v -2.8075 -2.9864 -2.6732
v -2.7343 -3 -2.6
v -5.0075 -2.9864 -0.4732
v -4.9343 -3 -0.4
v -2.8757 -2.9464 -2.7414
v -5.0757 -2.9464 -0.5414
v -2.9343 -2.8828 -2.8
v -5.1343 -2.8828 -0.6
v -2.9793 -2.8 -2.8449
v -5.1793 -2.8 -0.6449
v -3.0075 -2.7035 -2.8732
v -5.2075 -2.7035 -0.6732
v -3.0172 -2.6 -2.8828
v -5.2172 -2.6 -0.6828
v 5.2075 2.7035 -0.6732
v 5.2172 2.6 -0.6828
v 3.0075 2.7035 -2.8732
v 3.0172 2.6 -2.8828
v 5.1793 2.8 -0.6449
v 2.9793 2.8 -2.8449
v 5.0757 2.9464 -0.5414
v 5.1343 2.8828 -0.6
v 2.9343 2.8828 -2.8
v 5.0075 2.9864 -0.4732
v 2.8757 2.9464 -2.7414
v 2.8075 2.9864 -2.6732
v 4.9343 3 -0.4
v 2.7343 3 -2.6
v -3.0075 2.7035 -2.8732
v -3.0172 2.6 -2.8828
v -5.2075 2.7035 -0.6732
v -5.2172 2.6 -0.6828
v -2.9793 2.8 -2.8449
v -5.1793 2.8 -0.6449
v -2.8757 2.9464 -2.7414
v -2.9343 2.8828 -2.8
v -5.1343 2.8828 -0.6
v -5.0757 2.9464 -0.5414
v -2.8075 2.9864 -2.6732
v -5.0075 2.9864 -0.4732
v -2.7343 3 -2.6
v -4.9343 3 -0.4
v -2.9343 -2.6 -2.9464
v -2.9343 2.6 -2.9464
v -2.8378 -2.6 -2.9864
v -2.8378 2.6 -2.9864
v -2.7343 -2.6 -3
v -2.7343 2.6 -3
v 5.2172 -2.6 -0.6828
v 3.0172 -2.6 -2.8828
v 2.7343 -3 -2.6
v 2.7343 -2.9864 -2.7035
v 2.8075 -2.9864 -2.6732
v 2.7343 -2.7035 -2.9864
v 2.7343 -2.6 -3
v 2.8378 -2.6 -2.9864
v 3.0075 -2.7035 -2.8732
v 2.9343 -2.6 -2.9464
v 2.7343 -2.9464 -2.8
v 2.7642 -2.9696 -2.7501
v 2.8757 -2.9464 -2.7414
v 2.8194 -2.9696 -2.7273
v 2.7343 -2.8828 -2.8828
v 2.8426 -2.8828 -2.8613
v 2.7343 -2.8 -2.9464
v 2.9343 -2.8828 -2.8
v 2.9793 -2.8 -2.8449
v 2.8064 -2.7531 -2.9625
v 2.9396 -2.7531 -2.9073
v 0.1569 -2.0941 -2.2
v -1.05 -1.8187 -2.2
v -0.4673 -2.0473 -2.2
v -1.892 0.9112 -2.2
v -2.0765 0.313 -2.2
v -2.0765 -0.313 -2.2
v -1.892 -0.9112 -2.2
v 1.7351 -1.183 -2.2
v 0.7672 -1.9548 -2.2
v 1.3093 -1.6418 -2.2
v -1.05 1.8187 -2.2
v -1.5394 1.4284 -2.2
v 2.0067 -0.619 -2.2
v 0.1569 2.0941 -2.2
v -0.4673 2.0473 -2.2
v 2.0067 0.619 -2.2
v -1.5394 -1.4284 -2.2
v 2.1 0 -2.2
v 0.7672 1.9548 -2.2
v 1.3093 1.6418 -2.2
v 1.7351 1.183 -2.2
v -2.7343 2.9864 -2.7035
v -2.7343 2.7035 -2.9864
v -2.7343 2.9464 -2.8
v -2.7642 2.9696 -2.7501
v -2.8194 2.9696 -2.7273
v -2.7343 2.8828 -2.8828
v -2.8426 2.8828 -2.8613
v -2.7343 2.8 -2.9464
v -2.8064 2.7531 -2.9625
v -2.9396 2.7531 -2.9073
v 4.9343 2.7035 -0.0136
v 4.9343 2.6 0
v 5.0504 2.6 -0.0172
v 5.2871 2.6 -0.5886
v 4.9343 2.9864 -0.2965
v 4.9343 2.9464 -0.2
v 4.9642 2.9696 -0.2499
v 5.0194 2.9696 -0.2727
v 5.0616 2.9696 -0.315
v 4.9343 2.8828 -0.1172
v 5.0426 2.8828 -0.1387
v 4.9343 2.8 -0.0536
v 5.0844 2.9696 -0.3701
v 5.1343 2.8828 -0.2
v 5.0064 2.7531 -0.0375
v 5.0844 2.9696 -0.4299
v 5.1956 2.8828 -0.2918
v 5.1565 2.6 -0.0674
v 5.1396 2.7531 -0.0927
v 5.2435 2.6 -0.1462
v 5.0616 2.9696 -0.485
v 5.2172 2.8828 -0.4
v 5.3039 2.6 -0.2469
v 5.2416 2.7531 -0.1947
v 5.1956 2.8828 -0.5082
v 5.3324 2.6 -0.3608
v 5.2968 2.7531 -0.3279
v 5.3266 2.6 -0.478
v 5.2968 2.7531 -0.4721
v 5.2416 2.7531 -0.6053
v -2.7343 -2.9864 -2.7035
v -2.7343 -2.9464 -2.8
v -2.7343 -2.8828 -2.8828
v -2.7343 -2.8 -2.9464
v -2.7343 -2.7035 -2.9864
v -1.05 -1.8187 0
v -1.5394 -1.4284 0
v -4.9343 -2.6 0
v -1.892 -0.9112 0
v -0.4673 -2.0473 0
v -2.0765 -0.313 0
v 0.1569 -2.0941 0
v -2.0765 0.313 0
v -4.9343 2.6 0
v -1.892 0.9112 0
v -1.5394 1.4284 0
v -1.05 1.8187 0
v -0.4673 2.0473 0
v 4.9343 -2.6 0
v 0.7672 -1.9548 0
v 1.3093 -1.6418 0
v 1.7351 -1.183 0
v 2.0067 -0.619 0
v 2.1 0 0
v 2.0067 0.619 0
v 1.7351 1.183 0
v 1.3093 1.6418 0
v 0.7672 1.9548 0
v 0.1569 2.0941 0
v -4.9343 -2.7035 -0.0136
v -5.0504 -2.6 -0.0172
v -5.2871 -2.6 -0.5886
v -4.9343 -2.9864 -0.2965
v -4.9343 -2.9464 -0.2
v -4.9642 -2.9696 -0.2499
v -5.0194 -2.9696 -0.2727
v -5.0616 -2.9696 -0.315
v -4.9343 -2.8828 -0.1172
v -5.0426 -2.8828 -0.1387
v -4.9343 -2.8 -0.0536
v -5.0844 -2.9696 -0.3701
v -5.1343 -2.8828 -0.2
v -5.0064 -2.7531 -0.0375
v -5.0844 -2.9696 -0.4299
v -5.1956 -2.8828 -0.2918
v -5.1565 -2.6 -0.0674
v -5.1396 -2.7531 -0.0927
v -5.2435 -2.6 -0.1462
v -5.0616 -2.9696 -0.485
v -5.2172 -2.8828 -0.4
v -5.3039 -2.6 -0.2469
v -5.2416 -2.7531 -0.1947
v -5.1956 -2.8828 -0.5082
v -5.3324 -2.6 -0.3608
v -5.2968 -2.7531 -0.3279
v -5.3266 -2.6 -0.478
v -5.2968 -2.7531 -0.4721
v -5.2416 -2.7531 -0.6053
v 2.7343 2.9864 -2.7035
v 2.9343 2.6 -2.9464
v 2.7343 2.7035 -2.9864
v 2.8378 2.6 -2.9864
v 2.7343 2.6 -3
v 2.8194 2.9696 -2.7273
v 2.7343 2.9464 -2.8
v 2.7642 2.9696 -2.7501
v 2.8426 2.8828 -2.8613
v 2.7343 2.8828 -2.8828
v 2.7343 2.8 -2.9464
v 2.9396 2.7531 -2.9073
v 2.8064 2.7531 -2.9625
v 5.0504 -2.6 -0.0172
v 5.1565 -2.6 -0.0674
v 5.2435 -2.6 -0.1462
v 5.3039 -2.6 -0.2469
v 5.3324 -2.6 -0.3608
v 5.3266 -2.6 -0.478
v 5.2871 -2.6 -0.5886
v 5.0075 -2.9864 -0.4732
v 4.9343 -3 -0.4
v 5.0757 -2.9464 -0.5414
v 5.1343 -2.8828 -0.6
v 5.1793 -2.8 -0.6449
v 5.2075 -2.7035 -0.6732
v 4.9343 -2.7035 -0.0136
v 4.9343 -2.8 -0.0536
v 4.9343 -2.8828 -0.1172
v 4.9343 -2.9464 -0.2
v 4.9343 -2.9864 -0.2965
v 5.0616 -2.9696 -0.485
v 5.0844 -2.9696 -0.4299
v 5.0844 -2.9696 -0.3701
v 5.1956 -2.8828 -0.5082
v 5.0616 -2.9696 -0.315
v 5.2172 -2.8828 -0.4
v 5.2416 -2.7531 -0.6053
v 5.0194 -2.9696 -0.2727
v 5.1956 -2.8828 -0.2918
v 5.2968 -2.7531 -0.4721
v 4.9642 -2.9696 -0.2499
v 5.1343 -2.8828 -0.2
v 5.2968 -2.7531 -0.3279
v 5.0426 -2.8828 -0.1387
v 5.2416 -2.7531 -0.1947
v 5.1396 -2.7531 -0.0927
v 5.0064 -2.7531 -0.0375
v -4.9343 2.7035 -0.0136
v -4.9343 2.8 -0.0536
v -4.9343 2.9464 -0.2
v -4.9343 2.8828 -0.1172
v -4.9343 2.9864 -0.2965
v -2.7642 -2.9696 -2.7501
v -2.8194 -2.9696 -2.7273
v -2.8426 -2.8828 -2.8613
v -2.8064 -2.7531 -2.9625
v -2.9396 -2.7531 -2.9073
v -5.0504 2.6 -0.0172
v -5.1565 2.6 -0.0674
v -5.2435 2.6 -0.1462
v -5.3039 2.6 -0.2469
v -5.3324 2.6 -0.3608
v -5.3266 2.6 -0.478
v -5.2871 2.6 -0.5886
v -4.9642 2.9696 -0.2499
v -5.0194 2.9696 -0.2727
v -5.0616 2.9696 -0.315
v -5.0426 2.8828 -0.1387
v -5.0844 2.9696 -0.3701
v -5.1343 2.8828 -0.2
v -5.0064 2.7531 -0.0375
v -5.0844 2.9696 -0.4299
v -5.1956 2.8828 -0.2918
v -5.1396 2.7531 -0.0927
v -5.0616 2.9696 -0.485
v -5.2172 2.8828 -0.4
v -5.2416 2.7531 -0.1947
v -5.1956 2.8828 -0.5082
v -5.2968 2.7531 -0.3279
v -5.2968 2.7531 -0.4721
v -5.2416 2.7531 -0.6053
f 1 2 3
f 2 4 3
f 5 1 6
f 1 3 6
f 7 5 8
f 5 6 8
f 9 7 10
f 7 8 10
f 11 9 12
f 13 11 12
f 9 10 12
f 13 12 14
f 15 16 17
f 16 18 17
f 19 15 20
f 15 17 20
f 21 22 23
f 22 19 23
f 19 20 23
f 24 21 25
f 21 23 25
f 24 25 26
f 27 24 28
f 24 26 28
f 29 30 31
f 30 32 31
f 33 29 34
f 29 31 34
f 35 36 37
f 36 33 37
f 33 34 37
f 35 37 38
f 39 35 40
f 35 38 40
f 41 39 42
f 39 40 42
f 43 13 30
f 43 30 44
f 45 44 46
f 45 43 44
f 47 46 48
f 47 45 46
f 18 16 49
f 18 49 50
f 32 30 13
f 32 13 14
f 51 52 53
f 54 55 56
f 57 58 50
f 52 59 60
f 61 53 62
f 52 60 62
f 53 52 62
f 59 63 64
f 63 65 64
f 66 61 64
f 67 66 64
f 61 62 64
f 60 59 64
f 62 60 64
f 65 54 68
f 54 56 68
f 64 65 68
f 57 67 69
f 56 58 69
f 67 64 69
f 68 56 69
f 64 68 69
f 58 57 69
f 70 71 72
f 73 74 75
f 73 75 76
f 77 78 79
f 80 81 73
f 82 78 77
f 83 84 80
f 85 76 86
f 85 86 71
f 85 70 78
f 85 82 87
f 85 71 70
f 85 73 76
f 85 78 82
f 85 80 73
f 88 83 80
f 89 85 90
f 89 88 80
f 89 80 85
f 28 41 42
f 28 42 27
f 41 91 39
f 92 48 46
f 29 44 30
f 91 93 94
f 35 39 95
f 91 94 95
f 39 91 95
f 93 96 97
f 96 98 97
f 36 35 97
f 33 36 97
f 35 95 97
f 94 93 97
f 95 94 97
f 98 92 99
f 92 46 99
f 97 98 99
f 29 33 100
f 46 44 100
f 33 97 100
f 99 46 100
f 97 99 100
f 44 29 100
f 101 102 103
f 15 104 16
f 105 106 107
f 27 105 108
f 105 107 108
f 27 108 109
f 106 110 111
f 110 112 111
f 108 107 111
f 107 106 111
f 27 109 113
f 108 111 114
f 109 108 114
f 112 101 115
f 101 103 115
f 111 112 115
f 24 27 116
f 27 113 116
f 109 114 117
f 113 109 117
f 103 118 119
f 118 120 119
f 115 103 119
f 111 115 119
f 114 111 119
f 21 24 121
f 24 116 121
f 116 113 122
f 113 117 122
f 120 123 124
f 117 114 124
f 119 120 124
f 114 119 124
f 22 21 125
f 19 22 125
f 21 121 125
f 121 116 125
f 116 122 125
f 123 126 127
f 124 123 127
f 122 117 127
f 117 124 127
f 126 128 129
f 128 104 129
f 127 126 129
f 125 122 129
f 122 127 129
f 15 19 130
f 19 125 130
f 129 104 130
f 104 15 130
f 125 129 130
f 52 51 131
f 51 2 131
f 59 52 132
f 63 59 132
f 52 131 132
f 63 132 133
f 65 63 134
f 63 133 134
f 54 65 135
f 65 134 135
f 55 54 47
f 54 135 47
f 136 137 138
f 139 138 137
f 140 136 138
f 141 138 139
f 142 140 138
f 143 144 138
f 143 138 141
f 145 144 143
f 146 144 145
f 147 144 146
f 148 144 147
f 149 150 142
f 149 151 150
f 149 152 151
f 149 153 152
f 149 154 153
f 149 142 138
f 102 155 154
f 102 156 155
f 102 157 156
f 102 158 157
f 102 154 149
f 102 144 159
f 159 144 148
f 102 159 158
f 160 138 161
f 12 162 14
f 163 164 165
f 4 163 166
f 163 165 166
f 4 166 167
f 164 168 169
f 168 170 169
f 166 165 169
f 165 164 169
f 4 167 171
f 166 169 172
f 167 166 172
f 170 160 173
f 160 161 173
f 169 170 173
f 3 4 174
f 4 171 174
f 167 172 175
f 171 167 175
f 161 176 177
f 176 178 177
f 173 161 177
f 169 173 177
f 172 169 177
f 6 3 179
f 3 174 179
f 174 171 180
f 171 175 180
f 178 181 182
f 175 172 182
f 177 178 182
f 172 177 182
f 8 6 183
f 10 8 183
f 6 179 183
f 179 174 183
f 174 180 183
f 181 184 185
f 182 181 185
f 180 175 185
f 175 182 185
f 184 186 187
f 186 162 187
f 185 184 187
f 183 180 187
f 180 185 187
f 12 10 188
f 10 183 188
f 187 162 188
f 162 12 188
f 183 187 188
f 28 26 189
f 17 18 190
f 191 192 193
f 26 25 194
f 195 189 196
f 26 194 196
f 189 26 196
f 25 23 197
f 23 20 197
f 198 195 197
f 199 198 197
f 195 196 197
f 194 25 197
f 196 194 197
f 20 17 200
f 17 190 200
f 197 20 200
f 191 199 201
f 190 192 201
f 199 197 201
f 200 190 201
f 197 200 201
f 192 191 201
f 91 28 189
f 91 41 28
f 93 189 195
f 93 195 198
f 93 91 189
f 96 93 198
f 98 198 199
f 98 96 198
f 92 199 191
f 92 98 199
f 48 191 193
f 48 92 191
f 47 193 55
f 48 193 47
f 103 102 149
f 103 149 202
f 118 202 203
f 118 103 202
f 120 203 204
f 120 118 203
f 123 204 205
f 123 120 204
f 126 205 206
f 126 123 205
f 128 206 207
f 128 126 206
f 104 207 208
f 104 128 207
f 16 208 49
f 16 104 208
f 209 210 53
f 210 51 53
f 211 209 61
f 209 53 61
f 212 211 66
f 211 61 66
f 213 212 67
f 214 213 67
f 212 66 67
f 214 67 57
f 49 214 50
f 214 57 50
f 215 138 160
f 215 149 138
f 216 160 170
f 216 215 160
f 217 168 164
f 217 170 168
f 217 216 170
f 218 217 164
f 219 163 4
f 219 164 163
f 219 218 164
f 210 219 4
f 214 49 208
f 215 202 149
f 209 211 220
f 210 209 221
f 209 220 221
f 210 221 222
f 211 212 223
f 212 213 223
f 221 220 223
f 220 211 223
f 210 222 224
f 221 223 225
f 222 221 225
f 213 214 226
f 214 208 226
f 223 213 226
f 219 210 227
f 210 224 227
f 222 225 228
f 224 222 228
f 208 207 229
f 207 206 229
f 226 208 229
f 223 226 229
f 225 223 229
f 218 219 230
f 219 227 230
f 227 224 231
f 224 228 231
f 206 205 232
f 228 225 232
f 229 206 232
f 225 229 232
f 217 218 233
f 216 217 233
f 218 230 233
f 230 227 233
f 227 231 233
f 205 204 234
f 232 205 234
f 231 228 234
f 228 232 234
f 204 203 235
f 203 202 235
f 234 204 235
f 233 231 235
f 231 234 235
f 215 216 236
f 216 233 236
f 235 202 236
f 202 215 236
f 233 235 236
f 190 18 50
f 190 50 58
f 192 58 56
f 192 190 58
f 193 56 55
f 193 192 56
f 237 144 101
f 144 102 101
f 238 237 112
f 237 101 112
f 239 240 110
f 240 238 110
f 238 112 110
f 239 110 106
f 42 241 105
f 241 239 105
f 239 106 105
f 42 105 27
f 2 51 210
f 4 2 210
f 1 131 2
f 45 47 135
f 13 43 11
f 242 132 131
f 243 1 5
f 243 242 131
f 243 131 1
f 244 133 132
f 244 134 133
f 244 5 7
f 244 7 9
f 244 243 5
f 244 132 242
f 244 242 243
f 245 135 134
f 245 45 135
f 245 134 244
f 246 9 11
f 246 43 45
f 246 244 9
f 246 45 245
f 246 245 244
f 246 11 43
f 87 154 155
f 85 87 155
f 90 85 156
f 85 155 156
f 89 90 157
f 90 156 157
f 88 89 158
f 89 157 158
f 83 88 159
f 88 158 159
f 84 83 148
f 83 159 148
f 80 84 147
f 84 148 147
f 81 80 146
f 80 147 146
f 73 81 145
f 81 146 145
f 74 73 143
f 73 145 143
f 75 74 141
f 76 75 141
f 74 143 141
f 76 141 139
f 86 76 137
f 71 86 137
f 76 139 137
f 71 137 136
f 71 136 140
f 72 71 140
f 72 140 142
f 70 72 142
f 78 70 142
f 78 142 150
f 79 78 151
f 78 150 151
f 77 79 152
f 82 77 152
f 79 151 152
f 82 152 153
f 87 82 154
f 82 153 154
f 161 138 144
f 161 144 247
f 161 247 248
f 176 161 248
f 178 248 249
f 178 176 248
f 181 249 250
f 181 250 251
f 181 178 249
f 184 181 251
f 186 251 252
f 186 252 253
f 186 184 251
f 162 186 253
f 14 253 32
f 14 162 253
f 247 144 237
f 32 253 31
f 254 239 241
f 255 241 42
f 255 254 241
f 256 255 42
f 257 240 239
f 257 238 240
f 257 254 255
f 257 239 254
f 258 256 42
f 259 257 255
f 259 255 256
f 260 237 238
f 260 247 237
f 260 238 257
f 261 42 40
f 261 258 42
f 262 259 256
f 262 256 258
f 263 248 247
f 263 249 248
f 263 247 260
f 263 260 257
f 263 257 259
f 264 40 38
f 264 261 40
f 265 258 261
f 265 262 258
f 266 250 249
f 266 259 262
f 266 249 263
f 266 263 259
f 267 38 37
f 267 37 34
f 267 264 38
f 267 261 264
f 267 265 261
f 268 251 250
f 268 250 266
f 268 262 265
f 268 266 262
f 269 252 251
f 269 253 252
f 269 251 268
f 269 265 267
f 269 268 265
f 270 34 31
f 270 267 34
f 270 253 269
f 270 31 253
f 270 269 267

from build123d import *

# Parameters (mm, degrees)
EXTRUDE_1_DEPTH     = 3
SKETCH_3_R          = 2.1
CUT_EXTRUDE_1_DEPTH = 2.2
FILLET_1_R          = 0.4


with BuildPart() as part:
    # 草图2 → 凸台-拉伸1 (new body, symmetric)
    with BuildSketch(Plane(origin=(0, 0, 0), x_dir=(1, 0, 0), z_dir=(0, 1, 0))):
        Polygon((-5.9, 0), (5.9, 0), (2.9, 3), (-2.9, 3), align=None)
    extrude(amount=EXTRUDE_1_DEPTH, both=True)

    # 草图3 → 切除-拉伸1 (cut)
    with BuildSketch(Plane.XY):
        Circle(SKETCH_3_R)
    extrude(amount=-CUT_EXTRUDE_1_DEPTH, mode=Mode.SUBTRACT)

    # 圆角1
    fillet_1_edges = [part.edges().sort_by_distance(p)[0] for p in [
        (4.4, 3, -1.5),
        (0, 3, -3),
        (-4.4, 3, -1.5),
        (0, -3, -3),
        (4.4, -3, -1.5),
        (0, -3, 0),
        (-4.4, -3, -1.5),
        (-2.9, 0, -3),
        (2.9, 0, -3),
        (5.9, 0, 0),
        (-5.9, 0, 0),
        (0, 3, 0),
    ]]
    fillet(fillet_1_edges, radius=FILLET_1_R)


solid = part.part
